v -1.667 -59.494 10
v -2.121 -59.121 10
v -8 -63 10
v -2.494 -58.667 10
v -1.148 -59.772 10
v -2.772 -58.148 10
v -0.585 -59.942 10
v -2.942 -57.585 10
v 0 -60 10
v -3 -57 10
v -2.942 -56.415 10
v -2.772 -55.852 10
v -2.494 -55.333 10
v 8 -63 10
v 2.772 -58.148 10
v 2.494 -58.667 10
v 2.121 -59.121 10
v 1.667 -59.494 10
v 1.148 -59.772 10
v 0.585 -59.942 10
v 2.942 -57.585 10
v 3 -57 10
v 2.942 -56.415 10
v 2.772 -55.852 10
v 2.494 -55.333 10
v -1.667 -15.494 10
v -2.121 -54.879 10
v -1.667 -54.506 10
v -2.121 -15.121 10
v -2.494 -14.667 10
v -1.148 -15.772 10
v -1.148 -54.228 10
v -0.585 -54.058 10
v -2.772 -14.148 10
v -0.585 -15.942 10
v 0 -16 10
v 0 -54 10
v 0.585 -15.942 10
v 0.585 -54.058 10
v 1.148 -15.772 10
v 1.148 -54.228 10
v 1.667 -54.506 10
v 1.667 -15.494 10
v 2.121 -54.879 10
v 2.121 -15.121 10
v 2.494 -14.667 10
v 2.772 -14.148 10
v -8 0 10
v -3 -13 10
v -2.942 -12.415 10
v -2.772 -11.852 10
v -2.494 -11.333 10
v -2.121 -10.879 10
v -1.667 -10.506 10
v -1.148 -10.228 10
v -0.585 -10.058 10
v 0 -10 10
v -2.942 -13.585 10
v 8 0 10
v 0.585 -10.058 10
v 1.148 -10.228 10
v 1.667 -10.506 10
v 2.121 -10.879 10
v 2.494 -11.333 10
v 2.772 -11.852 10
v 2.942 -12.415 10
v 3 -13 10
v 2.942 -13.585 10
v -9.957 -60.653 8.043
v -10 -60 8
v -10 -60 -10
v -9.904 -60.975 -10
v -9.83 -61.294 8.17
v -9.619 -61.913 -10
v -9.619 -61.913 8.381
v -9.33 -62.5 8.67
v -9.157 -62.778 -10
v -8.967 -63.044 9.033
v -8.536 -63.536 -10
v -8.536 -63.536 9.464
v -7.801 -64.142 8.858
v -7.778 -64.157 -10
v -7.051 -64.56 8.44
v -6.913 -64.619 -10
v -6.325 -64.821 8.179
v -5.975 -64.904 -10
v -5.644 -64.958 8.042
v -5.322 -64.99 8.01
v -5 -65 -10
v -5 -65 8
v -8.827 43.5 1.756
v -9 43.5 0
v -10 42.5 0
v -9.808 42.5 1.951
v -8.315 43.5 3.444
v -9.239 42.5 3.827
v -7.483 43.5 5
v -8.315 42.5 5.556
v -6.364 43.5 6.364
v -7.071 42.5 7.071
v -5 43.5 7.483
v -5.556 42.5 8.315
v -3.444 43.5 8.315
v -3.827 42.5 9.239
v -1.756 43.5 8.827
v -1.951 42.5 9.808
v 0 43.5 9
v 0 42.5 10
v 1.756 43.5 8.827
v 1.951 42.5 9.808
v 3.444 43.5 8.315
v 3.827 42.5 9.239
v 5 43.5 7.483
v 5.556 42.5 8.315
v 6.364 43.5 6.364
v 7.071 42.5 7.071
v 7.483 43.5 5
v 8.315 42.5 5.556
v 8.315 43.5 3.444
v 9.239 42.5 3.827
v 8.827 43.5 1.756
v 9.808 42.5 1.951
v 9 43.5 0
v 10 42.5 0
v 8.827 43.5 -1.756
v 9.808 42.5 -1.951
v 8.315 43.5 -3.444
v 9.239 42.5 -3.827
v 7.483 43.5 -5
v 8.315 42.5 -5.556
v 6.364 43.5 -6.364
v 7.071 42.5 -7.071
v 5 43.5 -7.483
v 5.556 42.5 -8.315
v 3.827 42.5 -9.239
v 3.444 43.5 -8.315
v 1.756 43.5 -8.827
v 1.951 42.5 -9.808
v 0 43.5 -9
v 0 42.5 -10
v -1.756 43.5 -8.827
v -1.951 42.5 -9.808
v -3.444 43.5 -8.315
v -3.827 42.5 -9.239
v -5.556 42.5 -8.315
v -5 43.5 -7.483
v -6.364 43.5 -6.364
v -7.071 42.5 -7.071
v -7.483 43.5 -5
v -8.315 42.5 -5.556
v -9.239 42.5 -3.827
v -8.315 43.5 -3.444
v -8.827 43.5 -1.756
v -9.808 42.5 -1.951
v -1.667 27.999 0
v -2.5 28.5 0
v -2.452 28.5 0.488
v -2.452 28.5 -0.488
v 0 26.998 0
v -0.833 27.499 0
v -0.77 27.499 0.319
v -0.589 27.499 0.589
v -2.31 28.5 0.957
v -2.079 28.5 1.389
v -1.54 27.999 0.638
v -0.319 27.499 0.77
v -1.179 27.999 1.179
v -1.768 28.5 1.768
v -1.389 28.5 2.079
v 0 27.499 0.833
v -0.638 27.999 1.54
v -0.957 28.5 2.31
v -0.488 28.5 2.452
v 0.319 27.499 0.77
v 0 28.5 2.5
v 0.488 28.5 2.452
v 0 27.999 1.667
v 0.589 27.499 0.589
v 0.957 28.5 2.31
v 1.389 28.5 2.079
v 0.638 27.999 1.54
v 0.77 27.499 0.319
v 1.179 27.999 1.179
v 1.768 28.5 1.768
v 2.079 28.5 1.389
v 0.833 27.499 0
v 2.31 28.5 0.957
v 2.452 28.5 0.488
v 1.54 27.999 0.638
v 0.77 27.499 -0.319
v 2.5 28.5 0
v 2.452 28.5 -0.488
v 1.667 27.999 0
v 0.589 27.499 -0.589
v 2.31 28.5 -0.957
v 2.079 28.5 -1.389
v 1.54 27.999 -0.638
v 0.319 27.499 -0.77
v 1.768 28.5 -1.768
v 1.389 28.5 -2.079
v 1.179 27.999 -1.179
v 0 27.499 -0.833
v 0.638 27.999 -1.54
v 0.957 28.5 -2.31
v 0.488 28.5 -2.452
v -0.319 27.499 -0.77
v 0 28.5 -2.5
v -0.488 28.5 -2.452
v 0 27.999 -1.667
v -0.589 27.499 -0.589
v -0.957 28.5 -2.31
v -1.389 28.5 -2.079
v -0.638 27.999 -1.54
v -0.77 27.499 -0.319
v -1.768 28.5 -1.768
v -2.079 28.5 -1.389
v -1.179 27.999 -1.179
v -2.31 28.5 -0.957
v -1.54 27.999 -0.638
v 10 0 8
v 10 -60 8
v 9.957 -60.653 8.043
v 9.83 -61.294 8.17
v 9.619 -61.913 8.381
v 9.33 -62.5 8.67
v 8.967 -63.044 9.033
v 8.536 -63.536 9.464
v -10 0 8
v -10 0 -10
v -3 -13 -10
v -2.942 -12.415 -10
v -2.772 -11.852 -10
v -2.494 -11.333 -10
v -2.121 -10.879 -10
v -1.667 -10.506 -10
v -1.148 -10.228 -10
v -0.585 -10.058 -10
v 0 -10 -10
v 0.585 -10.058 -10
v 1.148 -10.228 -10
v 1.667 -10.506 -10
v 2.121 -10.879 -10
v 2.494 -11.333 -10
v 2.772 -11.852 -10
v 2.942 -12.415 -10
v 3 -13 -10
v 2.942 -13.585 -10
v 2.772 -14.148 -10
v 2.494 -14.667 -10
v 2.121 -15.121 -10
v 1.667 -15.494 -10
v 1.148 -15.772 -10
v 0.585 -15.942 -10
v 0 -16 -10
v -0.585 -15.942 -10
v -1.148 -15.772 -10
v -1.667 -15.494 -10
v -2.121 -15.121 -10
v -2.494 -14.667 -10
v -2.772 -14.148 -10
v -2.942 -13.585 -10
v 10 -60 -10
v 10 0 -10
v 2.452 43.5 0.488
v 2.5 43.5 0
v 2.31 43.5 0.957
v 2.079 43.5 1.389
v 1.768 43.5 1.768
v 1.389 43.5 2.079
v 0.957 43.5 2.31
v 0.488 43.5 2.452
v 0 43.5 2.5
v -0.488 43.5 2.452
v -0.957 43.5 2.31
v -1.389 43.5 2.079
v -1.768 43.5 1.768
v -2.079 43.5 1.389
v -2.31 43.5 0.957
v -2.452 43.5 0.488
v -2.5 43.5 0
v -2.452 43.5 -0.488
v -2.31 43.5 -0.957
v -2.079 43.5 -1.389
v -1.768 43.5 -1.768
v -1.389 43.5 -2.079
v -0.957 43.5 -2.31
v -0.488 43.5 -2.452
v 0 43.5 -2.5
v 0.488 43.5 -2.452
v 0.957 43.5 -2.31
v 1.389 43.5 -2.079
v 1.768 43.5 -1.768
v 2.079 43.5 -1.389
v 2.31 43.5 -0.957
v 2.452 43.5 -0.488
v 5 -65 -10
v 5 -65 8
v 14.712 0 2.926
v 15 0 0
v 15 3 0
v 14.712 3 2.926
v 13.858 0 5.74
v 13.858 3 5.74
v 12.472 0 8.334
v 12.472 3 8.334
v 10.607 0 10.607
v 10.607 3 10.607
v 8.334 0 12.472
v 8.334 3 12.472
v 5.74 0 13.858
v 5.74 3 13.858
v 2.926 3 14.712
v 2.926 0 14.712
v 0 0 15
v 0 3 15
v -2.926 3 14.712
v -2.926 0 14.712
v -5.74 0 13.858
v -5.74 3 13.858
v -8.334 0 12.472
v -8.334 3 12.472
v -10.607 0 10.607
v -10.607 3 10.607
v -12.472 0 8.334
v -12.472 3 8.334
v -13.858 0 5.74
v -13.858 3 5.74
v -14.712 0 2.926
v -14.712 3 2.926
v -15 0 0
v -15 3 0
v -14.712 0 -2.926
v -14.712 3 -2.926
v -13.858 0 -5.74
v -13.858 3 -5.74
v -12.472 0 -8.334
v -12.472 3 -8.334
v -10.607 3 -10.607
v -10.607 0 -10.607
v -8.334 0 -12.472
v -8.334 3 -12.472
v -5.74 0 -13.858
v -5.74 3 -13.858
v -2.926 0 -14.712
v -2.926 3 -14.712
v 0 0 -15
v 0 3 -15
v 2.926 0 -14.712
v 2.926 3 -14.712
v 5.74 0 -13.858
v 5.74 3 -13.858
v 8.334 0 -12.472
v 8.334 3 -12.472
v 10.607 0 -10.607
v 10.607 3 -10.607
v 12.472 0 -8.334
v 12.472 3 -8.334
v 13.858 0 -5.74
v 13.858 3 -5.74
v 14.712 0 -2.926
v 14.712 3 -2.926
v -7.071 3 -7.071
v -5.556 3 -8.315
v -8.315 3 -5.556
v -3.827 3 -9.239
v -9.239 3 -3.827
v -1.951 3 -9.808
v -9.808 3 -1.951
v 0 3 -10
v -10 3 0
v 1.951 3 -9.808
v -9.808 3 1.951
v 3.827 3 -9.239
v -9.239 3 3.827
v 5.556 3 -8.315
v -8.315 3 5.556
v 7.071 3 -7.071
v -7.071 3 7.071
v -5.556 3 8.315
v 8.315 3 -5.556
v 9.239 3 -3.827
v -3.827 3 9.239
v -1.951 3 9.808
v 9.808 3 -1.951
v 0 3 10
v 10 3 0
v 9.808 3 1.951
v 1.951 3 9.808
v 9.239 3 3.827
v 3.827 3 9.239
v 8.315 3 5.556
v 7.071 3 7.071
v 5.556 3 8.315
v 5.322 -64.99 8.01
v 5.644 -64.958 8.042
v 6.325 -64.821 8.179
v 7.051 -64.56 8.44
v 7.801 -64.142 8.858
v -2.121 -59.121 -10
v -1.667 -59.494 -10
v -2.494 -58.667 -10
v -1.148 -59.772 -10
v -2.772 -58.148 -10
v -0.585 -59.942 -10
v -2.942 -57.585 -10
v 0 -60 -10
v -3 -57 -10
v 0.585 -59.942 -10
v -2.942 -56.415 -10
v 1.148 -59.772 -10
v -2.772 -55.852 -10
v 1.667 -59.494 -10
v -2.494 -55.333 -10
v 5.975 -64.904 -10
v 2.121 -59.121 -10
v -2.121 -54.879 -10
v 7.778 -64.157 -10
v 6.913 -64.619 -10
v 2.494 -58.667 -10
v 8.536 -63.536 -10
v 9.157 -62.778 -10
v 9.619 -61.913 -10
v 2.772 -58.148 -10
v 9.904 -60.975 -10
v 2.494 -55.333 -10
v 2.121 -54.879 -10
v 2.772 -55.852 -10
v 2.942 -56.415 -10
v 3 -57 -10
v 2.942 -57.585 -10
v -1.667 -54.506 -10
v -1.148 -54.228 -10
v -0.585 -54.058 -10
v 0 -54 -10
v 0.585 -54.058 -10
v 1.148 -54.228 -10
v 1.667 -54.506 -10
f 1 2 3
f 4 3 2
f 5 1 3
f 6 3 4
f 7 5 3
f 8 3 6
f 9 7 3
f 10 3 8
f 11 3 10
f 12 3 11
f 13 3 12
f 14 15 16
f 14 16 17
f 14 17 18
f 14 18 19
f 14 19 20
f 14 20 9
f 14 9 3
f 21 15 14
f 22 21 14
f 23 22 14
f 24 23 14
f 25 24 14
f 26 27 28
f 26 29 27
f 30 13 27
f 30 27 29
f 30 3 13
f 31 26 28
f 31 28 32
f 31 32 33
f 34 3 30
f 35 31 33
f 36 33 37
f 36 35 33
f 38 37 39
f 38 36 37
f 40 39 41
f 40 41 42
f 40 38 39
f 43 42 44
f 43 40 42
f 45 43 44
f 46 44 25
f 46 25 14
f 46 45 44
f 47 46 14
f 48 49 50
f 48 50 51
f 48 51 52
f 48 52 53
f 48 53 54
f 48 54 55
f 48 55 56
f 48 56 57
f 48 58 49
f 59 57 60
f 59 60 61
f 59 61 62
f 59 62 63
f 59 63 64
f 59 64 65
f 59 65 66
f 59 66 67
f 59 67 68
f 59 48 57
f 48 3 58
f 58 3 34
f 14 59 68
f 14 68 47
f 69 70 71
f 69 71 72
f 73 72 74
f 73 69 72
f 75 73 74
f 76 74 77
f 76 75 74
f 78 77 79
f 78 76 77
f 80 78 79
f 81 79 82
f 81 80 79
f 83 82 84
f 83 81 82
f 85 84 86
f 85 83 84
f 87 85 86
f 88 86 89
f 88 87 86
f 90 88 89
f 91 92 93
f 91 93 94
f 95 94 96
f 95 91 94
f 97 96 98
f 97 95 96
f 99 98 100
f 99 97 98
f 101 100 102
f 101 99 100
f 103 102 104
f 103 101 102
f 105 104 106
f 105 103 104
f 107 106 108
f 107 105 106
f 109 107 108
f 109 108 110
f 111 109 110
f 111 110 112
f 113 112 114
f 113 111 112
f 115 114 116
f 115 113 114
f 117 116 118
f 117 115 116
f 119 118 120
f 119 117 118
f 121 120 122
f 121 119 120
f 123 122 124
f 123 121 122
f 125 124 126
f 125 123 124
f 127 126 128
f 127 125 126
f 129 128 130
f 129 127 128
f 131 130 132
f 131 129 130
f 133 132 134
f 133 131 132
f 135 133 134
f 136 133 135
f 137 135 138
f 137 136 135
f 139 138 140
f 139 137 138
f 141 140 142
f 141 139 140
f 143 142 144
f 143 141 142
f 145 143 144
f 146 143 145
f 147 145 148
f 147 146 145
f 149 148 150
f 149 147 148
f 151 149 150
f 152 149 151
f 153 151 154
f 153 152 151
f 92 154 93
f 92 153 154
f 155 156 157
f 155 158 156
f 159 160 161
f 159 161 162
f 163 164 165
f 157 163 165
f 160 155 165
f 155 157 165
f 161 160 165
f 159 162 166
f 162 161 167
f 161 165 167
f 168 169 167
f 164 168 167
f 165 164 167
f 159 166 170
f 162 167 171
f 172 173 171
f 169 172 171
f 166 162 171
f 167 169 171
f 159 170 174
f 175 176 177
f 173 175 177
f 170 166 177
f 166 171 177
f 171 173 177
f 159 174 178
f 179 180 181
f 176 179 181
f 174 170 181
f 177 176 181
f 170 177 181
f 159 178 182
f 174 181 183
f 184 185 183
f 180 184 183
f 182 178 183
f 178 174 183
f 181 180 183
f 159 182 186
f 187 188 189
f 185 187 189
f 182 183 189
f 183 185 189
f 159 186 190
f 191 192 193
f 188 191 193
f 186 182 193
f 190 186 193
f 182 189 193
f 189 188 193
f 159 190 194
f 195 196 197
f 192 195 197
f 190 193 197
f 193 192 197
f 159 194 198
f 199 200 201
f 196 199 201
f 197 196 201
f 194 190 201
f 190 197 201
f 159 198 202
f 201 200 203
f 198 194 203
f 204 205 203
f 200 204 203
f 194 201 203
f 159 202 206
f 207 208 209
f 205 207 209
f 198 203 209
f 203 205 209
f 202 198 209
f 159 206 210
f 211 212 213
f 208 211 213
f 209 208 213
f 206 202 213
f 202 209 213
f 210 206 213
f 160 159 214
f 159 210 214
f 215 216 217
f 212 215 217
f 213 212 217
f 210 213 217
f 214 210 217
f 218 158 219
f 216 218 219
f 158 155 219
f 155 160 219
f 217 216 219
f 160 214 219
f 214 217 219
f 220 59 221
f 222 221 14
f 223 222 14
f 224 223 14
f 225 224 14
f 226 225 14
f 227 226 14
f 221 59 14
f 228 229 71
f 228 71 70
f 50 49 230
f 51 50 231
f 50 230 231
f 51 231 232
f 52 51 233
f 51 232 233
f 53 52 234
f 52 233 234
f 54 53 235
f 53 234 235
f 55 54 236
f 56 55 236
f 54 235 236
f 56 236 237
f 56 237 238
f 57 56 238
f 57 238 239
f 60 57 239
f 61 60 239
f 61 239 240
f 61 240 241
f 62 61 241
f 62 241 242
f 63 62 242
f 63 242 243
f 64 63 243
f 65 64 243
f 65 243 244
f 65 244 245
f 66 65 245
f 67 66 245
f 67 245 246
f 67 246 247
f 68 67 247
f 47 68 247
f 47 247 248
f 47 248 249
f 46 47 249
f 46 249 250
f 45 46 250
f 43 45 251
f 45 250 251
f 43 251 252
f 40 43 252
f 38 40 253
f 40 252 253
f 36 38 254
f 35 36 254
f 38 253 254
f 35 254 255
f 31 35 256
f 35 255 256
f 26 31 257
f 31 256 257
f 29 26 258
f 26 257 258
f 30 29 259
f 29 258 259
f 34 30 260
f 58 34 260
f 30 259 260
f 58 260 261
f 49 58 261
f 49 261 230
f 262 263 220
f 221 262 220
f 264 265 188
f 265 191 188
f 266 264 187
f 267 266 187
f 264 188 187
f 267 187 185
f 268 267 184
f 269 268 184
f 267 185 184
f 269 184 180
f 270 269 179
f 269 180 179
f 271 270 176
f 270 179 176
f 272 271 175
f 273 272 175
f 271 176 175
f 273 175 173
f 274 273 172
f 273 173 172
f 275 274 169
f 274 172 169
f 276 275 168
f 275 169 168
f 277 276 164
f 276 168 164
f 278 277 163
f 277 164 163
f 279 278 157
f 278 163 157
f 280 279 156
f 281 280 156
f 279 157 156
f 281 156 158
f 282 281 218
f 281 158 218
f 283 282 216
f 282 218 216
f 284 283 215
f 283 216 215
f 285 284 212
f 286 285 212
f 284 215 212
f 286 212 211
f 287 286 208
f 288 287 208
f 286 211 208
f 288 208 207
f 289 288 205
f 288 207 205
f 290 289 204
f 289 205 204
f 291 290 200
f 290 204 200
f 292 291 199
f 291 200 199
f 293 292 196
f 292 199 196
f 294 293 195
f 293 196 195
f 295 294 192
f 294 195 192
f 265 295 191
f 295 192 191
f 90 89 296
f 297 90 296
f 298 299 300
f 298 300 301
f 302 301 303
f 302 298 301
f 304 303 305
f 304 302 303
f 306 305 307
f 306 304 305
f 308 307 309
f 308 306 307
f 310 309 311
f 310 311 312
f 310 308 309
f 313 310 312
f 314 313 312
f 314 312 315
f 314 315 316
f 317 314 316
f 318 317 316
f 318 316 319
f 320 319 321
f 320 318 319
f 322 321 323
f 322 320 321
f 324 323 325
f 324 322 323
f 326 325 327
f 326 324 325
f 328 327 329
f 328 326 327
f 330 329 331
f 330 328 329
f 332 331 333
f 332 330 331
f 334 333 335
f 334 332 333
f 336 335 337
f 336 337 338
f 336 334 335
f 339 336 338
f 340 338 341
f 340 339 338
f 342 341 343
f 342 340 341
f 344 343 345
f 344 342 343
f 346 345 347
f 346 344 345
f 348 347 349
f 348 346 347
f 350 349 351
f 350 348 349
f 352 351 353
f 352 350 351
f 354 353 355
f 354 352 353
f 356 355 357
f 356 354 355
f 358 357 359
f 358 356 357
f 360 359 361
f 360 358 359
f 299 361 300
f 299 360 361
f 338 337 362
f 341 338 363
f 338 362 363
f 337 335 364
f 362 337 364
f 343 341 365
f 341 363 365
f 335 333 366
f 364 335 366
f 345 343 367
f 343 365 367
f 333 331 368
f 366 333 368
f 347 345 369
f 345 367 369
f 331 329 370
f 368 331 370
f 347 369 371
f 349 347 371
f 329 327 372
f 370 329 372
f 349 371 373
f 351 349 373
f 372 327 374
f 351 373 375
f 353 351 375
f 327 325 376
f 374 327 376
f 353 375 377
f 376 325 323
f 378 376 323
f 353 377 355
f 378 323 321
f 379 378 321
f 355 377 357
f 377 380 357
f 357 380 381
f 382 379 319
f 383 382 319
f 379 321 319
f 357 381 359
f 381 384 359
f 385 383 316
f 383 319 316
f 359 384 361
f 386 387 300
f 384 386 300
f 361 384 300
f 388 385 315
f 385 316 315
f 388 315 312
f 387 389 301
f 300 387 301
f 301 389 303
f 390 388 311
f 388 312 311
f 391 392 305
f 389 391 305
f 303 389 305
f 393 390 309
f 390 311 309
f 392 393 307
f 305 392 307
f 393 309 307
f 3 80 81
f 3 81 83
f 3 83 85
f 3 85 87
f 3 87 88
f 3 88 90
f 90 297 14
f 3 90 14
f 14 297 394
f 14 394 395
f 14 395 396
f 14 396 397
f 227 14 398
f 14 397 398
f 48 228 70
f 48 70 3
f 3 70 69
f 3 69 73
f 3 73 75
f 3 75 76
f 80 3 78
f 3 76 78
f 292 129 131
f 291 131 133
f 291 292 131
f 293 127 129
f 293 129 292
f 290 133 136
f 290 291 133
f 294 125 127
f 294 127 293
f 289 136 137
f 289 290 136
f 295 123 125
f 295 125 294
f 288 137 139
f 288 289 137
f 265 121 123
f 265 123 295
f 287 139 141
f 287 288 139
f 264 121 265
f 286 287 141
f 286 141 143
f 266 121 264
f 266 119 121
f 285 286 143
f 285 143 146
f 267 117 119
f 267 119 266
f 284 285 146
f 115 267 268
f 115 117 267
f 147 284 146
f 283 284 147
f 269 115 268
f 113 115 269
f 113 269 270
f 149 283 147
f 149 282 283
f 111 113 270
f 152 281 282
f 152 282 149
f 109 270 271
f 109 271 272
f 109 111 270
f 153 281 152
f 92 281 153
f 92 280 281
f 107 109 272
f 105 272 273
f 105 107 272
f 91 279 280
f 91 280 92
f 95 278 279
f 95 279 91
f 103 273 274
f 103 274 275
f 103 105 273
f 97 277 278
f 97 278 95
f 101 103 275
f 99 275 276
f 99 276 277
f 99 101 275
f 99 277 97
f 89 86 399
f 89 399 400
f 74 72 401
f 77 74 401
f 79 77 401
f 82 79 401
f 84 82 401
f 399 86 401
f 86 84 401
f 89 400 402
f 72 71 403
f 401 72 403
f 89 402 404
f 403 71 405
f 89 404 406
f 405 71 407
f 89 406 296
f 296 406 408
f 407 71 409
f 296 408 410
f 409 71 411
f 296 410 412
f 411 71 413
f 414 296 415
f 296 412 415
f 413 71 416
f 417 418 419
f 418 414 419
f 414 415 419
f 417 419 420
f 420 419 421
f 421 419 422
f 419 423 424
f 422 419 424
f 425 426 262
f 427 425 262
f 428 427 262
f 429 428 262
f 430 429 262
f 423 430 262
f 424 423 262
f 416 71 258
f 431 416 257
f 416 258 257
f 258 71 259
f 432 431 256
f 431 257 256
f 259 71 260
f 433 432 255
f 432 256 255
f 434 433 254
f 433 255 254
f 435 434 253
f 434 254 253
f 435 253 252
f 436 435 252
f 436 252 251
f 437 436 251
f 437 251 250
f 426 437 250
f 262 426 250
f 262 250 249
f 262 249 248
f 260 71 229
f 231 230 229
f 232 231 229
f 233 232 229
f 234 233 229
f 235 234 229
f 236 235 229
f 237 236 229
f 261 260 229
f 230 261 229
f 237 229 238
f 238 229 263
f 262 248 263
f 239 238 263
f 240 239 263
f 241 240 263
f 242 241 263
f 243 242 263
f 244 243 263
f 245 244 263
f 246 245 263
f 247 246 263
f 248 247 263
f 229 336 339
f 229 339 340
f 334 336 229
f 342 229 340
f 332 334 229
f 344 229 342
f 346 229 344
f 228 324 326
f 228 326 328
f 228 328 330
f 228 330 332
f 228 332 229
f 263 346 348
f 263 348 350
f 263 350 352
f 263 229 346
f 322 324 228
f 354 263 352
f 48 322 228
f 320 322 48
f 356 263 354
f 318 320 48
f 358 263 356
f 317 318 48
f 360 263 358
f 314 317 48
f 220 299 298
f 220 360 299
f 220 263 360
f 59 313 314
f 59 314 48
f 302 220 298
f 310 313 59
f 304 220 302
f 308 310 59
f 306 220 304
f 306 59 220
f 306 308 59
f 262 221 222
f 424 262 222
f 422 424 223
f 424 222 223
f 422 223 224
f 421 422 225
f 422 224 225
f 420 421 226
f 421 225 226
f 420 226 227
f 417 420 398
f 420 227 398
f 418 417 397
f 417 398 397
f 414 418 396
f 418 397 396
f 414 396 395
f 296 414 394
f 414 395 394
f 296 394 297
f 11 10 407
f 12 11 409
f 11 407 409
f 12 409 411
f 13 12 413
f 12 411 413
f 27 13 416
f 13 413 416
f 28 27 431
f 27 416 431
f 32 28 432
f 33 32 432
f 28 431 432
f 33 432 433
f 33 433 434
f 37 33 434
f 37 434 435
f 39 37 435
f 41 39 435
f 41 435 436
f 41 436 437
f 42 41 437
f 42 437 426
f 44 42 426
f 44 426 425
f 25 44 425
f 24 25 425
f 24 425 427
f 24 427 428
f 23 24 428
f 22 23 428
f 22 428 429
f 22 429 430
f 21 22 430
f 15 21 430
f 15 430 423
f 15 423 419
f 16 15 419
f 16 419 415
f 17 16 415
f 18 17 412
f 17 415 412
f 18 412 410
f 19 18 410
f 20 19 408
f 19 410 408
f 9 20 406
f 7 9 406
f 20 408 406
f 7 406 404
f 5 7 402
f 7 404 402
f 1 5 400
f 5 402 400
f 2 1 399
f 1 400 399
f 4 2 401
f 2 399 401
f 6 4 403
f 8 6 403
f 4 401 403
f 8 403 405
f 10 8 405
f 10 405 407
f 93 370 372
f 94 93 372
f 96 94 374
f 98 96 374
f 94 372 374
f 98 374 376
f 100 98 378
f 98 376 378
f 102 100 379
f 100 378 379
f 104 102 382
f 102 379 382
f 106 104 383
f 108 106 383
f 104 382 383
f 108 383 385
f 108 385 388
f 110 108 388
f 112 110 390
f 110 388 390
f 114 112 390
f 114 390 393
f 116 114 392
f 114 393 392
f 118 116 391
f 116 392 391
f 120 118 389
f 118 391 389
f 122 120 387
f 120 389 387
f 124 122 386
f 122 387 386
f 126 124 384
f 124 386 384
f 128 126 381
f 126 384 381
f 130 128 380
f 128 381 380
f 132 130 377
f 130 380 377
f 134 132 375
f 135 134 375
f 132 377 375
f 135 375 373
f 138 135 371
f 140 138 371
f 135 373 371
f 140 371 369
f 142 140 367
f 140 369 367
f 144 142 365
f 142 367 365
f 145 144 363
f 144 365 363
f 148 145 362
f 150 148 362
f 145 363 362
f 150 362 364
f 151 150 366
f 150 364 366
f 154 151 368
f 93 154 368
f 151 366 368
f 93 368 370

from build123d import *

# Parameters (mm, degrees)
F0_W      = 20
F0_H      = 20
F1_DEPTH  = 65
F0_R      = 15
F1_FACE_W = 20
F1_FACE_H = 20
F2_DEPTH  = 3
F3_R      = 10
F4_DEPTH  = 40.5
F6_D      = 5
F6_DEPTH  = 15
F6_TIP    = 1.5021515476
F7_SIZE   = 1
F9_D      = 6
F10_SIZE  = 2
F11_R     = 5


with BuildPart() as f1:
    # F0 (on Front) → F1 (new body)
    with BuildSketch(Plane.XZ):
        Rectangle(F0_W, F0_H)
    extrude(amount=F1_DEPTH)

    # F0 (on Front) + F1_face (on face) → F2 (join)
    with BuildSketch(Plane.XZ):
        Circle(F0_R)
        Rectangle(F0_W, F0_H, mode=Mode.SUBTRACT)
        Rectangle(F0_W, F0_H)
    with BuildSketch(Plane(origin=(0, 0, 0), x_dir=(1, 0, 0), z_dir=(0, 1, 0))):
        Rectangle(F1_FACE_W, F1_FACE_H)
    extrude(amount=-F2_DEPTH, dir=(0, -1, 0))

    # F3 (on face) → F4 (join)
    with BuildSketch(Plane(origin=(0, 3, 0), x_dir=(-1, 0, 0), z_dir=(0, 1, 0))):
        Circle(F3_R)
    extrude(amount=F4_DEPTH)

    # F6
    with Locations(Plane(origin=(0, 43.5, 0), x_dir=(-1, 0, 0), z_dir=(0, 1, 0))):
        with Locations((0, 0)):
            Hole(F6_D / 2, depth=F6_DEPTH)
            with Locations((0, 0, -(F6_DEPTH + F6_TIP / 2))):  # 118° drill point
                Cone(0, F6_D / 2, F6_TIP, mode=Mode.SUBTRACT)

    # F7
    f7_edges = [f1.edges().sort_by_distance(p)[0] for p in [
        (10, 43.5, 0),
    ]]
    chamfer(f7_edges, length=F7_SIZE)

    # F9 (through all)
    with Locations(Plane.XY.offset(10)):
        with Locations((0, -13), (0, -57)):
            Hole(F9_D / 2)

    # F10
    f10_edges = [f1.edges().sort_by_distance(p)[0] for p in [
        (0, -65, 10),
        (-10, -32.5, 10),
        (10, -32.5, 10),
    ]]
    chamfer(f10_edges, length=F10_SIZE)

    # F11
    f11_edges = [f1.edges().sort_by_distance(p)[0] for p in [
        (-10, -65, -1),
        (10, -65, -1),
    ]]
    fillet(f11_edges, radius=F11_R)


solid = f1.part
